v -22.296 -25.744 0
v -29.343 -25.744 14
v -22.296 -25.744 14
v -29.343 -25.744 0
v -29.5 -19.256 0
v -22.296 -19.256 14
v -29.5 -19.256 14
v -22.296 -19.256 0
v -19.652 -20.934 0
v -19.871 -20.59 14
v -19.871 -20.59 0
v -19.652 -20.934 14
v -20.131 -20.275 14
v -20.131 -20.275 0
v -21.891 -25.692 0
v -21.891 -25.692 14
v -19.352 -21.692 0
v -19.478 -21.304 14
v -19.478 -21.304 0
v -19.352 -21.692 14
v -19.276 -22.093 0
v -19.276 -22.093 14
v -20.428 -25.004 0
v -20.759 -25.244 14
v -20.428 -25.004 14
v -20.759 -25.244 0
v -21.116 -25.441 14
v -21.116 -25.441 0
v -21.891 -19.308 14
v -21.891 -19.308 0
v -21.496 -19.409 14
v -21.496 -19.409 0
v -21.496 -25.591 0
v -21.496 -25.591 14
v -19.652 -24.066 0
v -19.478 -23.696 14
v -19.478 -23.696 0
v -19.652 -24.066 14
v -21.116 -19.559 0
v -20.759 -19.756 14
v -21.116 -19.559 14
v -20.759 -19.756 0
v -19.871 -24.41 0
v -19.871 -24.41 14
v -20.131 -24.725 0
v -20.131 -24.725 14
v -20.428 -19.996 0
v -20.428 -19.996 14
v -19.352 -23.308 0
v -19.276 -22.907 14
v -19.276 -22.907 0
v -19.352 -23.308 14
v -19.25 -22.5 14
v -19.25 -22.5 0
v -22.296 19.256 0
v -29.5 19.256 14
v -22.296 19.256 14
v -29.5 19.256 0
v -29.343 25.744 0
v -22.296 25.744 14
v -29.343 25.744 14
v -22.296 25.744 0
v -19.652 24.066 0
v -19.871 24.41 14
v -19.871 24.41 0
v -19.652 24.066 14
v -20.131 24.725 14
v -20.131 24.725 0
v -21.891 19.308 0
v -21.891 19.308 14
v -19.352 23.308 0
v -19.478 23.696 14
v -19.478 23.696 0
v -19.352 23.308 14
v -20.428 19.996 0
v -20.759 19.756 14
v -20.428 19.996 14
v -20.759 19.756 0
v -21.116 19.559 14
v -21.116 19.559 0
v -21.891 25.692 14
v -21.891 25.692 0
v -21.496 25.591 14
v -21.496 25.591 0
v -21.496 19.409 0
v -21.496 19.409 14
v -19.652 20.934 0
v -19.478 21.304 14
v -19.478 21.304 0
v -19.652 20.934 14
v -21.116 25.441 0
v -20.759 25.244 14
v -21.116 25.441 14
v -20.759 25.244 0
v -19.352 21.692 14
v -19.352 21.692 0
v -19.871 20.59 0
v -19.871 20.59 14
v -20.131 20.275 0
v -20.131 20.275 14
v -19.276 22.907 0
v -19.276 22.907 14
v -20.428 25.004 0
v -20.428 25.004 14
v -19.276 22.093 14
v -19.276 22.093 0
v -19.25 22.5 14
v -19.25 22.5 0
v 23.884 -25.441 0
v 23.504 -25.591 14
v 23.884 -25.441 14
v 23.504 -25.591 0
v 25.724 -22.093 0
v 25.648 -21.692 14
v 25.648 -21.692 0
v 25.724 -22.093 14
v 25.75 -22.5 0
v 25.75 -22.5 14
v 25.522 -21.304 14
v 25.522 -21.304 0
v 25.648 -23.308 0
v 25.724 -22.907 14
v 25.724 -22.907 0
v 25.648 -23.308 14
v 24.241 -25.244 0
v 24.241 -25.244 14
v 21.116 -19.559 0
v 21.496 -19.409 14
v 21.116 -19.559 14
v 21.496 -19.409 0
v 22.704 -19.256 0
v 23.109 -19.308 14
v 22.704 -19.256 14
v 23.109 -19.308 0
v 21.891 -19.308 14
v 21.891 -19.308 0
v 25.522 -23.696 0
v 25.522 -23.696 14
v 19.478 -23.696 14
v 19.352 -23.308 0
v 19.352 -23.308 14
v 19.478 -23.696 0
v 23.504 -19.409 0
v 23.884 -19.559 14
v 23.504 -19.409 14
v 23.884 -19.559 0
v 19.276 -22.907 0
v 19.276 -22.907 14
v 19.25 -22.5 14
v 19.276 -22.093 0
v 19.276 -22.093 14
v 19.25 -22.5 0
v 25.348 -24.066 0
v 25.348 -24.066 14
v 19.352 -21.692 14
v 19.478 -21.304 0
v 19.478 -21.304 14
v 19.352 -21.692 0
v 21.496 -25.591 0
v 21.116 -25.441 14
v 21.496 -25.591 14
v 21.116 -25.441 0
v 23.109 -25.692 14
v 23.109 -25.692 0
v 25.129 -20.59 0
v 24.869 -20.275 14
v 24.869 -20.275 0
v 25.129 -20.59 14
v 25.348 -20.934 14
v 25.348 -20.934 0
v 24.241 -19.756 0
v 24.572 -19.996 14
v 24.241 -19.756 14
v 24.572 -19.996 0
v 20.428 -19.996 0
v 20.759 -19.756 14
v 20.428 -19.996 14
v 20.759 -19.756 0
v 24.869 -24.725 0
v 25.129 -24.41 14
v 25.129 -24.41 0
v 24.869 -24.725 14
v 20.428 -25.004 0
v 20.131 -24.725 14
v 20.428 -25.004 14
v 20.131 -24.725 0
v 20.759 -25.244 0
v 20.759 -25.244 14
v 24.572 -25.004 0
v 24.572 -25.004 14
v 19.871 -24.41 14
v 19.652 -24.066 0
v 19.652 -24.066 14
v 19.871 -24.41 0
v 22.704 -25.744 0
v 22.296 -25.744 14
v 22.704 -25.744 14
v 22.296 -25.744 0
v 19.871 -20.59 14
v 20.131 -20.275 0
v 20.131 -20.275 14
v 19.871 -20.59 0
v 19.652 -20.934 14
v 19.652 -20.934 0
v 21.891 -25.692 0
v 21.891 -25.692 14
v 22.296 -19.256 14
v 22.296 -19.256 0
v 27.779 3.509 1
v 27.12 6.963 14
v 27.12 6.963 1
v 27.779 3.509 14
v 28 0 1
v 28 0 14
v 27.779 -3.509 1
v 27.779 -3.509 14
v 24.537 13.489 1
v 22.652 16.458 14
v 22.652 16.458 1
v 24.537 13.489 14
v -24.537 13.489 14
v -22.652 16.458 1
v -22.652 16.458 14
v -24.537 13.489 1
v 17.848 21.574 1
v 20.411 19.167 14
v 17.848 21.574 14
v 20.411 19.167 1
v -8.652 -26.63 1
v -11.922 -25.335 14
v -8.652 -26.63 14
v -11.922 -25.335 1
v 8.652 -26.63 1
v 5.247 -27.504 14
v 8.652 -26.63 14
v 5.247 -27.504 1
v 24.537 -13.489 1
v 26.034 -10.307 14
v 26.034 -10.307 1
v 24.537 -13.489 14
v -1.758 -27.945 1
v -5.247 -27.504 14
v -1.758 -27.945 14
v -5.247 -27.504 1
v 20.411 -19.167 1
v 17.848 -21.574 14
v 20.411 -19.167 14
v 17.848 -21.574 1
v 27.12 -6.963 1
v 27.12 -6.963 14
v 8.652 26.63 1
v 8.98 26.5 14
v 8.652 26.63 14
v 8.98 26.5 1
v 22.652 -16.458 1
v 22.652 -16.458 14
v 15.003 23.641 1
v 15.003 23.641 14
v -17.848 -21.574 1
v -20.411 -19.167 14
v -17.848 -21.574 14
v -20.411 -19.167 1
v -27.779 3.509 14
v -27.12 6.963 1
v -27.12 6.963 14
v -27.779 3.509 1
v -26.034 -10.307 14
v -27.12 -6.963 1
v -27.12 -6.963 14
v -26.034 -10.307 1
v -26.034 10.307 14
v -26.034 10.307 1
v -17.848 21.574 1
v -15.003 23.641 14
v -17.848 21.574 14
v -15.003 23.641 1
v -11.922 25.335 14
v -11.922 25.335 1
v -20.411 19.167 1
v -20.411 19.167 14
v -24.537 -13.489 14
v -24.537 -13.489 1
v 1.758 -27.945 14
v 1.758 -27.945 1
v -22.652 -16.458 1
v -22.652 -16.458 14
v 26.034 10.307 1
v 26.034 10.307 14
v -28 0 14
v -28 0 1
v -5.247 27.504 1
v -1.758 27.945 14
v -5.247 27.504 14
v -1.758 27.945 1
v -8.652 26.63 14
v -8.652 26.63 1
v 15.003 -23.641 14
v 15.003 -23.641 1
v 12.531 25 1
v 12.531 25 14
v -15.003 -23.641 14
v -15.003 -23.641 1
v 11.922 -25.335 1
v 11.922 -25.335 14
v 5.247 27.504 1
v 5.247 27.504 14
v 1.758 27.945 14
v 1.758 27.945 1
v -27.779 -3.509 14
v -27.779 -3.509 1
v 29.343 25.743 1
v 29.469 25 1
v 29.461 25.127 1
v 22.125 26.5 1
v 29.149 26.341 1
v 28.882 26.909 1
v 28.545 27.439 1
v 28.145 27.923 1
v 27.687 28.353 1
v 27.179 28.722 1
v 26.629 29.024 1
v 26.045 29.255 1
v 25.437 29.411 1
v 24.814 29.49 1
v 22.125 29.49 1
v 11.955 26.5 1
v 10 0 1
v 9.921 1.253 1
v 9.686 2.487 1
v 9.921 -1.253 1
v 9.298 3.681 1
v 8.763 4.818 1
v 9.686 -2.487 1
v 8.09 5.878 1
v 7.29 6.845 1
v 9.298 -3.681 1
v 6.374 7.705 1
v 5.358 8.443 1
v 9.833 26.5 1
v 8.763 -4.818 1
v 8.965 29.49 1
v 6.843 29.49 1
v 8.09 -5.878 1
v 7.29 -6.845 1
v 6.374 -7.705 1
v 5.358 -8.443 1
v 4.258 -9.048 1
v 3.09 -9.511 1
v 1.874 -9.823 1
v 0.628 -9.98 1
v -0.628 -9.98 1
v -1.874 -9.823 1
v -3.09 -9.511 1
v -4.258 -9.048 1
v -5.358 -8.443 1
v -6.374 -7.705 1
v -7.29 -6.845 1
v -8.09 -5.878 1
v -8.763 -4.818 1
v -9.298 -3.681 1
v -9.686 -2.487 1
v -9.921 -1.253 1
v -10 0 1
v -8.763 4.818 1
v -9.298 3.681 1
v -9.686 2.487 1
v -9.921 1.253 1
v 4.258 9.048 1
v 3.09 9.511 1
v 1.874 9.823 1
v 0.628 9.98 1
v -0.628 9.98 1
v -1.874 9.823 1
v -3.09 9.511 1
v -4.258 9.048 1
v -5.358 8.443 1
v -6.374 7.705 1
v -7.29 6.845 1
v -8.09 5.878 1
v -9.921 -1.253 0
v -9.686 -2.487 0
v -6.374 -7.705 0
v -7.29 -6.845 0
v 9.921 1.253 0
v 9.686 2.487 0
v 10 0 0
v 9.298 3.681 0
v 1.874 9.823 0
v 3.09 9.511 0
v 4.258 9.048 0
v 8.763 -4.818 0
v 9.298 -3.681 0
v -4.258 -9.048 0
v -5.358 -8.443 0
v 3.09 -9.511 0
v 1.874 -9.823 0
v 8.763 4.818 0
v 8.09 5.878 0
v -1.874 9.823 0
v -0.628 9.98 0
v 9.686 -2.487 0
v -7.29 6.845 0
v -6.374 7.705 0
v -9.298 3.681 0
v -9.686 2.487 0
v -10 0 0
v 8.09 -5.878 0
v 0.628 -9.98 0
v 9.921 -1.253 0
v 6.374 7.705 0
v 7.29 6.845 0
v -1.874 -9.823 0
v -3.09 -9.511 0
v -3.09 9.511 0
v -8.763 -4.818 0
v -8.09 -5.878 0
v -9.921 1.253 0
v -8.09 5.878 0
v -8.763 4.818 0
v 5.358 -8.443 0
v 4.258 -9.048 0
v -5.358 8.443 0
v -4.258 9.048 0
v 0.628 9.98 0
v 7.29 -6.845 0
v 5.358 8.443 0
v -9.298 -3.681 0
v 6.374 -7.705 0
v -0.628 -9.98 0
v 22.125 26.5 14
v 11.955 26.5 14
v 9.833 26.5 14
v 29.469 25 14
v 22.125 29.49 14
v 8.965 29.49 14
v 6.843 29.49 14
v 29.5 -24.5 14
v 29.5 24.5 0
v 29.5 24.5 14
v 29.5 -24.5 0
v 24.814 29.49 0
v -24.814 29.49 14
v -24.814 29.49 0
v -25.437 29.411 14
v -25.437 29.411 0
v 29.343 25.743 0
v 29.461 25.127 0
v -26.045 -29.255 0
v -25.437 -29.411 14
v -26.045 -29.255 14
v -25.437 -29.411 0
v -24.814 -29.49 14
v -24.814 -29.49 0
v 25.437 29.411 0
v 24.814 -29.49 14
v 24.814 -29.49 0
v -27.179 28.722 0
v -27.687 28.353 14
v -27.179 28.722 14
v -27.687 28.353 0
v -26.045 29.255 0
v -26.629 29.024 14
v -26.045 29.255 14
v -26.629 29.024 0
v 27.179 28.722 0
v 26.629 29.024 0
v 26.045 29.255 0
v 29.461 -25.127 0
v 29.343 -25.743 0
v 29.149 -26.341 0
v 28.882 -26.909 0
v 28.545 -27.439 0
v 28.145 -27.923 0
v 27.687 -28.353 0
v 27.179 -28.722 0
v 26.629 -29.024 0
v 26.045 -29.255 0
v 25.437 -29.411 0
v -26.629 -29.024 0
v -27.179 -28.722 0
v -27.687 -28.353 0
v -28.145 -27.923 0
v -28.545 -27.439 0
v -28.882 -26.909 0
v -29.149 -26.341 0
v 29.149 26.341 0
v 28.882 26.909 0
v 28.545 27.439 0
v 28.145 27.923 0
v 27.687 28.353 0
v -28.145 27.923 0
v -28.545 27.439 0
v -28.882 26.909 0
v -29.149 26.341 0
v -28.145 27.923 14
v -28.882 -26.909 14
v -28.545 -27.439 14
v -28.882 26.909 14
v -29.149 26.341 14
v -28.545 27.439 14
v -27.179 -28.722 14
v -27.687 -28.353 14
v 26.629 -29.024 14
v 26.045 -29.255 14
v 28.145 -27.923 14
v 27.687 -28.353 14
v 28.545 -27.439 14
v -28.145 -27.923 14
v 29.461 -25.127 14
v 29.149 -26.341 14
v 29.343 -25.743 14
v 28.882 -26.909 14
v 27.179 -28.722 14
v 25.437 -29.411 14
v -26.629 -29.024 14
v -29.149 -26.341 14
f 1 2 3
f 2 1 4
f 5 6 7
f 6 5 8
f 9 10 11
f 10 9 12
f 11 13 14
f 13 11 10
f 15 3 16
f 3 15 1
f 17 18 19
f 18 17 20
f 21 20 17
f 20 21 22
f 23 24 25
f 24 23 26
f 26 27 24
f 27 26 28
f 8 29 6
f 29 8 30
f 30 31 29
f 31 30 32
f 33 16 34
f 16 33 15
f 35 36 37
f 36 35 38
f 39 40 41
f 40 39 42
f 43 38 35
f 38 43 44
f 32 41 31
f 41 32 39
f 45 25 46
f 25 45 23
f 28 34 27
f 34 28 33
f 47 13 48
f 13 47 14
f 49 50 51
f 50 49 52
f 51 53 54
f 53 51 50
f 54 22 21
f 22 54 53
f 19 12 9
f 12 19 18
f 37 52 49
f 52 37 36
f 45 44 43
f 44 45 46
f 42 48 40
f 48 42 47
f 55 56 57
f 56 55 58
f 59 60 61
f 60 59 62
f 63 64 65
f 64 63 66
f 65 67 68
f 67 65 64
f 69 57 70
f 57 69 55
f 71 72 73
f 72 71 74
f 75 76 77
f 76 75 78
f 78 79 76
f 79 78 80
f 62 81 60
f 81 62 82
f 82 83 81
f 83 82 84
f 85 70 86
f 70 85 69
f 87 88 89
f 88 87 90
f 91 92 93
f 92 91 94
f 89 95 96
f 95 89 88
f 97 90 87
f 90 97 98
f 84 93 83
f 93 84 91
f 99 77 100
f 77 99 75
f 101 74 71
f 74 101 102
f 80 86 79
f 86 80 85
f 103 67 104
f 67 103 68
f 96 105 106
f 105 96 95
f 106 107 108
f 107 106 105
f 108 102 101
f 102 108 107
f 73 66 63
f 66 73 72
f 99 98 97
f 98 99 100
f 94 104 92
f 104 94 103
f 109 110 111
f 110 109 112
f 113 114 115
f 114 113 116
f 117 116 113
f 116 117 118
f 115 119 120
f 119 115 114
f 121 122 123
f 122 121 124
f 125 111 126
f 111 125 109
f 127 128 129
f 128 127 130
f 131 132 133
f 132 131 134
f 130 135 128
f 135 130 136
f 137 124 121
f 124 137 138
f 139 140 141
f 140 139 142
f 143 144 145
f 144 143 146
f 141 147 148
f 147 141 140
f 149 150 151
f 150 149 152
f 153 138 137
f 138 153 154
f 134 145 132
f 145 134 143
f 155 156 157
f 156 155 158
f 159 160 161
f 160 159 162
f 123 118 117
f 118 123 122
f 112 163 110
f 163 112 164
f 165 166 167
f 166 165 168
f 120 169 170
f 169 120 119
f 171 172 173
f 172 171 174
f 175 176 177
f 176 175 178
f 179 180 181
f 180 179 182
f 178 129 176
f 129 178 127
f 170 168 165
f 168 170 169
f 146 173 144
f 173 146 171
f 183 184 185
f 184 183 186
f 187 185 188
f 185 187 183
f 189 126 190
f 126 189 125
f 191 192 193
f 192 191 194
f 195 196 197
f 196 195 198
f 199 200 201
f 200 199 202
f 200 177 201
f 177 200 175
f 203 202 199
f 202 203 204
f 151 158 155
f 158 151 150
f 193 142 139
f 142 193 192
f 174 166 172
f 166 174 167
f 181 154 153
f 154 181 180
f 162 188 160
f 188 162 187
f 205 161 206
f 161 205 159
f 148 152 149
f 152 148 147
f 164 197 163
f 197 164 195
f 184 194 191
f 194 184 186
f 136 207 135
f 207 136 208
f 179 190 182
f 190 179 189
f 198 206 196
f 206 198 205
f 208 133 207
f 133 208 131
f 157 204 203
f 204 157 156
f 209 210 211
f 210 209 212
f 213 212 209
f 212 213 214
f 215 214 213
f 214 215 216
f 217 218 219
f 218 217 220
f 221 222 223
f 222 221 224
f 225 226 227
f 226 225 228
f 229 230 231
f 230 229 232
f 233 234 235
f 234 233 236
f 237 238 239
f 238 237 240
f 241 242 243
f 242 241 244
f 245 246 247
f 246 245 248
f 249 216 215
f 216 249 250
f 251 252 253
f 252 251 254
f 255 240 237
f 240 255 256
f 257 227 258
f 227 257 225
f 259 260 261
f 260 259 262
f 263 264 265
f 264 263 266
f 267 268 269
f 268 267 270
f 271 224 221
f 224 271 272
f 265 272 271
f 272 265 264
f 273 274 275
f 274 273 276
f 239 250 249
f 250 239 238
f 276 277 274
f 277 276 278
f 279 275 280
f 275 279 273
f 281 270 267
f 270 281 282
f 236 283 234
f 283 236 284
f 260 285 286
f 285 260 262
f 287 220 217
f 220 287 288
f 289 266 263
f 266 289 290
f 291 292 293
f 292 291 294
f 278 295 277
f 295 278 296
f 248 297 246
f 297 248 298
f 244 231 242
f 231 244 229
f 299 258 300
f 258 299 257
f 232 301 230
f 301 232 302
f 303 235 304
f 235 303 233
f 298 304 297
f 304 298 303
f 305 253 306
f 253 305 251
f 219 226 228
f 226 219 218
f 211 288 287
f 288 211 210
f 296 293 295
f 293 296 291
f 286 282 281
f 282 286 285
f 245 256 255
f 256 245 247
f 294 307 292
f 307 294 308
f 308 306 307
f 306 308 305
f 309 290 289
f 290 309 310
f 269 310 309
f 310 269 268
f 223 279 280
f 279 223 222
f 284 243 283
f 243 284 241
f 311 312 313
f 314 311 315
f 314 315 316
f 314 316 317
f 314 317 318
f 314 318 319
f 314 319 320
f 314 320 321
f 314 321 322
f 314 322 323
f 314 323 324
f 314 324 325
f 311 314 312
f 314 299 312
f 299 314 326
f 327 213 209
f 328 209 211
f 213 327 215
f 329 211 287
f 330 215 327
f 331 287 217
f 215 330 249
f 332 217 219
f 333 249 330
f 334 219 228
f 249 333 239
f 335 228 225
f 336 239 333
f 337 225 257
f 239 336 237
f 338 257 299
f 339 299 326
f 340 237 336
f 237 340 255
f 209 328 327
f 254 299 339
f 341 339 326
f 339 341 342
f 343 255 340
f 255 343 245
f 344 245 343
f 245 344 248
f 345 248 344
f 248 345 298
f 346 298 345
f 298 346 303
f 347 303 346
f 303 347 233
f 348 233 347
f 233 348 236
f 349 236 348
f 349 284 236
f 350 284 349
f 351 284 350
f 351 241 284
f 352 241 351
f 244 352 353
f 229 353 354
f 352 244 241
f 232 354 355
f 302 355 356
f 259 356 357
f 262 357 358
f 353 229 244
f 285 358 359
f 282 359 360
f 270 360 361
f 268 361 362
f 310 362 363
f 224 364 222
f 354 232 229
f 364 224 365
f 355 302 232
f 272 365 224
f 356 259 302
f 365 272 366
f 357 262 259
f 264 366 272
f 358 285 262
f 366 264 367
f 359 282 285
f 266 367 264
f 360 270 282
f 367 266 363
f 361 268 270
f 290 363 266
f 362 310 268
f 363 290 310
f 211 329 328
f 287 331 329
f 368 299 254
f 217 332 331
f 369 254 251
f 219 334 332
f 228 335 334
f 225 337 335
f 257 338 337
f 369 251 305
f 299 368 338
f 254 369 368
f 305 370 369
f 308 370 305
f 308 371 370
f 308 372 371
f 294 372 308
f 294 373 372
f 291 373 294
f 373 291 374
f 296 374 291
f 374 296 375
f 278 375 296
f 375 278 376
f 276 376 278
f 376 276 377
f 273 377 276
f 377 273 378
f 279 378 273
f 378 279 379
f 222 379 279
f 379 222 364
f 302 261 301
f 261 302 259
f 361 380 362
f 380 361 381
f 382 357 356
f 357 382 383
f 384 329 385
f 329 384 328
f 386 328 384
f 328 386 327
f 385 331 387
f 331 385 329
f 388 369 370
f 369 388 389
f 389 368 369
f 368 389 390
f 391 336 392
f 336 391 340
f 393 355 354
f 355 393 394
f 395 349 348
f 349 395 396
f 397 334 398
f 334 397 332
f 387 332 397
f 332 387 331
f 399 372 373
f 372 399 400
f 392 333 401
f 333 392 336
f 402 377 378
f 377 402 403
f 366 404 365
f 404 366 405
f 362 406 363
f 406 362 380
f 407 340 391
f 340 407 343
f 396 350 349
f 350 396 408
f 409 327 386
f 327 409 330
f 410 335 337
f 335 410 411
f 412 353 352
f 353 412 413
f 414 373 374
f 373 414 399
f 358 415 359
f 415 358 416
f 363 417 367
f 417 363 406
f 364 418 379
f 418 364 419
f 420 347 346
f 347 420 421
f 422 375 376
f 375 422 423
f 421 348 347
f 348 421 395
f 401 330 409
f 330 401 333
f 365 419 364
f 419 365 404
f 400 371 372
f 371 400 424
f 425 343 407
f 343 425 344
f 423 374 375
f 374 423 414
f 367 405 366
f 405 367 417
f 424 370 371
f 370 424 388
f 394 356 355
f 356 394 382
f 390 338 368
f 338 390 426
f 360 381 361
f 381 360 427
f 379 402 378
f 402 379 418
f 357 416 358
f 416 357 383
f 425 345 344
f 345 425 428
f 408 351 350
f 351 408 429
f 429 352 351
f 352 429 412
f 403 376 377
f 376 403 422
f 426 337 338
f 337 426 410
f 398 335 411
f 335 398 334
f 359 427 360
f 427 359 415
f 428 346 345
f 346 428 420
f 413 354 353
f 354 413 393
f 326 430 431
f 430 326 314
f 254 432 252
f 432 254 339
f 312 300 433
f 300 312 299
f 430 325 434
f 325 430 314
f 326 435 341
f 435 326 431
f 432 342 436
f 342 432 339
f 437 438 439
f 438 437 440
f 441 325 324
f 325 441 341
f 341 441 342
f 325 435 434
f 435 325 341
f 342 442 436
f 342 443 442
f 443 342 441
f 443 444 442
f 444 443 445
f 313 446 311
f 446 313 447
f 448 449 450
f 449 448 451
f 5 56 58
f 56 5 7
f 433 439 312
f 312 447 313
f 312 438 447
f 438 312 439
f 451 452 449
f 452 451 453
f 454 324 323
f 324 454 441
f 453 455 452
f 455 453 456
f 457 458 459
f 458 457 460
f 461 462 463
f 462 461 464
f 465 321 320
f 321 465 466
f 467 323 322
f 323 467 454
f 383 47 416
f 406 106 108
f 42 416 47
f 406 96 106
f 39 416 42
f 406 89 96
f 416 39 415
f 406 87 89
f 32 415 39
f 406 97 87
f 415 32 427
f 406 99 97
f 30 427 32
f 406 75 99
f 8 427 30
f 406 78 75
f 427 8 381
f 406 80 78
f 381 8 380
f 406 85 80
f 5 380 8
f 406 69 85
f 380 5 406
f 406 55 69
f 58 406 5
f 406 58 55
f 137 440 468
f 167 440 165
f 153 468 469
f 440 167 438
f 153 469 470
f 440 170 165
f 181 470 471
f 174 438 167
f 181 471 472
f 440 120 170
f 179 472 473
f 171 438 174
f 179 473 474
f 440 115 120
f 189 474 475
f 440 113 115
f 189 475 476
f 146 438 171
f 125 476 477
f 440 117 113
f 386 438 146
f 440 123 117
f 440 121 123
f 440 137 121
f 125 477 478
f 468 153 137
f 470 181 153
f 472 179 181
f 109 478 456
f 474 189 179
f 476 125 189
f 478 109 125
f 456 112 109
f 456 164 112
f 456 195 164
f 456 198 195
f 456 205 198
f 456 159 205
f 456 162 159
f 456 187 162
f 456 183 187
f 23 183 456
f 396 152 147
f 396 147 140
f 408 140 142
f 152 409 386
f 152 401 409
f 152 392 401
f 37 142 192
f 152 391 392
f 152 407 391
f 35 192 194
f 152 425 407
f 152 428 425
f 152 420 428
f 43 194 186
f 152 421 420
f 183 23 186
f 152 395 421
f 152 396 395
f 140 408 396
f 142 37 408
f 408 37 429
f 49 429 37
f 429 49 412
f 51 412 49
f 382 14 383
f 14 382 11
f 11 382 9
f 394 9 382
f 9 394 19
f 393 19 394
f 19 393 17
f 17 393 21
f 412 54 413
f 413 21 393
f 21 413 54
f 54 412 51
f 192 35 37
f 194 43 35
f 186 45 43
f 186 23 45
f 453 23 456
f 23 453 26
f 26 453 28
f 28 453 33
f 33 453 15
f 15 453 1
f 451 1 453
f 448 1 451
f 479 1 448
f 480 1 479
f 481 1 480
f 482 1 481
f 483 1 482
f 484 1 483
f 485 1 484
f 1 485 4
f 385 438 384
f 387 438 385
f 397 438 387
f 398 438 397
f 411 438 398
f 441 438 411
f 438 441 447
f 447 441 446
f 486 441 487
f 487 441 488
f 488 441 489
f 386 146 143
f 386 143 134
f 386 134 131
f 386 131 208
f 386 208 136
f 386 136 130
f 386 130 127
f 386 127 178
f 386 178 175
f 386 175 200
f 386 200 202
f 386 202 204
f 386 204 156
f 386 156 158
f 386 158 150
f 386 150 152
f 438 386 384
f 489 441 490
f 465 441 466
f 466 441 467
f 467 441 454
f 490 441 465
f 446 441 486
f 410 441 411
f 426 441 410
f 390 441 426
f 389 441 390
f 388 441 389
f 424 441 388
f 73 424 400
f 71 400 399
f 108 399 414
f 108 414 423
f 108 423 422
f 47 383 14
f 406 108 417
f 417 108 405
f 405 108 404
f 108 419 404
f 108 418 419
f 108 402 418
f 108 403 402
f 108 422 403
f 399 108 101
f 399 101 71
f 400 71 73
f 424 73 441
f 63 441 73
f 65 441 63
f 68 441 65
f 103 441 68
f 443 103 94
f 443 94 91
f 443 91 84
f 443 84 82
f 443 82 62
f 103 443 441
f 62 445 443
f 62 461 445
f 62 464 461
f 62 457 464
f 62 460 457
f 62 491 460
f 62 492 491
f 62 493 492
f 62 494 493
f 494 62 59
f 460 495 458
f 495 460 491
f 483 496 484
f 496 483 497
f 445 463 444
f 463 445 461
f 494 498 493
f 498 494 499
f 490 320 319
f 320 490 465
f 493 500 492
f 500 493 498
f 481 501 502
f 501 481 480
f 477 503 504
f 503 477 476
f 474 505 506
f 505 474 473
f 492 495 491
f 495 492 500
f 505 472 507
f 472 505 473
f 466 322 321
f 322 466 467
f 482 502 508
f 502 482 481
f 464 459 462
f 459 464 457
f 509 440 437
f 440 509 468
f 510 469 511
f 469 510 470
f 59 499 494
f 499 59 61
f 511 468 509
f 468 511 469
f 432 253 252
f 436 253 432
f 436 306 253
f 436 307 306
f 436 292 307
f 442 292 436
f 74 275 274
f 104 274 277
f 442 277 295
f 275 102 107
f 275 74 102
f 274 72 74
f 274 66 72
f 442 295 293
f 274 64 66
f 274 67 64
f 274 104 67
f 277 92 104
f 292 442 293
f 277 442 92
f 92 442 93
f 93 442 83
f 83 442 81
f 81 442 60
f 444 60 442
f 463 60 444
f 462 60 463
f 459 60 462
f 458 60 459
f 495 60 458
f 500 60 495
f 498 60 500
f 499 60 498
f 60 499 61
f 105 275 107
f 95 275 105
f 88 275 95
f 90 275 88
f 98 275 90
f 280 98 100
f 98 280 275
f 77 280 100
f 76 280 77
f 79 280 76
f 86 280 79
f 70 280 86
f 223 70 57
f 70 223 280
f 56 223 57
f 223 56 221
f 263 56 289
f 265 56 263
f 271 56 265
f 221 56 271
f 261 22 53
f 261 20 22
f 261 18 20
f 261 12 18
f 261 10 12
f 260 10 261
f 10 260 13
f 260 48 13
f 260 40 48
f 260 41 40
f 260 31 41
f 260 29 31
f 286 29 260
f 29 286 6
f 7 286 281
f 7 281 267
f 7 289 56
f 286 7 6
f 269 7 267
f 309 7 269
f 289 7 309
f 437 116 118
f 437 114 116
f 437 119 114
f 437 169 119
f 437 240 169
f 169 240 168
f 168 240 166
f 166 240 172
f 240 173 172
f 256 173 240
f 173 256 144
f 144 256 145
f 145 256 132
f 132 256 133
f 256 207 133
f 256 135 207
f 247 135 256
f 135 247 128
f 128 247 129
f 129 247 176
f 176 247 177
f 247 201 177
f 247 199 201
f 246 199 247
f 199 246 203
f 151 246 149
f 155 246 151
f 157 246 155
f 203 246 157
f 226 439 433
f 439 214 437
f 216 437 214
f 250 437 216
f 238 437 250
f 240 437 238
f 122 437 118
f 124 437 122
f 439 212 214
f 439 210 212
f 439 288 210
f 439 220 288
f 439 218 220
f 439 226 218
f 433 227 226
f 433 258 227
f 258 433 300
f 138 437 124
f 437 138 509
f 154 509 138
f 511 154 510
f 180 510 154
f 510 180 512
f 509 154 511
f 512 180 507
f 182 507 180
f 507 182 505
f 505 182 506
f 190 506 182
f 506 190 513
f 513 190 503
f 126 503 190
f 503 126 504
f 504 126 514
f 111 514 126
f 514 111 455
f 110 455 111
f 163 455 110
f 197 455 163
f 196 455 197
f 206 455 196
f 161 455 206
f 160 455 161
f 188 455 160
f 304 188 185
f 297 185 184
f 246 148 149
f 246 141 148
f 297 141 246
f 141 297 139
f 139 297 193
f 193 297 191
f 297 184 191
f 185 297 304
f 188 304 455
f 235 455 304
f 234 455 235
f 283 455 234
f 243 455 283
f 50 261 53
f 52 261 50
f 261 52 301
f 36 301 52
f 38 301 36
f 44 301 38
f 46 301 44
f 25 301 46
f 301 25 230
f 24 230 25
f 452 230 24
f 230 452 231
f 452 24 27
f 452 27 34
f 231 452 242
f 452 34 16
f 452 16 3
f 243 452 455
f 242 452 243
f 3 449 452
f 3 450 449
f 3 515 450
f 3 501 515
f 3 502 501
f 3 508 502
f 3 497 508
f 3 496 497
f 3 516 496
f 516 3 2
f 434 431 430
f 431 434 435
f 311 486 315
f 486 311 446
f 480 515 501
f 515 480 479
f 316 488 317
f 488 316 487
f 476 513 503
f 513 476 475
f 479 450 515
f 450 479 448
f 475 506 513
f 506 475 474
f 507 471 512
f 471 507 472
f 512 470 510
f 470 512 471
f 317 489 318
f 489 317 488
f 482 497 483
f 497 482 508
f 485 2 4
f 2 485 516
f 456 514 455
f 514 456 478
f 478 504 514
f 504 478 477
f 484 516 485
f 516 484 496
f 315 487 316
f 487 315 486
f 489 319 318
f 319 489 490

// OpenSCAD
$fn = 50;


difference() {
	union() {
		translate(v = [0, 0, 0]) {
			rotate(a = [0, 0, 0]) {
				hull() {
					translate(v = [-24.5000000000, 24.5000000000, 0]) {
						rotate(a = [0, 0, 0]) {
							translate(v = [0, 0, 0]) {
								rotate(a = [0, 0, 0]) {
									cylinder(h = 14, r = 5);
								}
							}
						}
					}
					translate(v = [24.5000000000, 24.5000000000, 0]) {
						rotate(a = [0, 0, 0]) {
							translate(v = [0, 0, 0]) {
								rotate(a = [0, 0, 0]) {
									cylinder(h = 14, r = 5);
								}
							}
						}
					}
					translate(v = [-24.5000000000, -24.5000000000, 0]) {
						rotate(a = [0, 0, 0]) {
							translate(v = [0, 0, 0]) {
								rotate(a = [0, 0, 0]) {
									cylinder(h = 14, r = 5);
								}
							}
						}
					}
					translate(v = [24.5000000000, -24.5000000000, 0]) {
						rotate(a = [0, 0, 0]) {
							translate(v = [0, 0, 0]) {
								rotate(a = [0, 0, 0]) {
									cylinder(h = 14, r = 5);
								}
							}
						}
					}
				}
			}
		}
	}
	union() {
		translate(v = [-30.0000000000, -22.5000000000, -125]) {
			rotate(a = [0, 0, 0]) {
				hull() {
					translate(v = [7.5000000000, 0, 0]) {
						rotate(a = [0, 0, 0]) {
							translate(v = [0, 0, 0]) {
								rotate(a = [0, 0, 0]) {
									cylinder(h = 250, r = 3.2500000000);
								}
							}
						}
					}
					translate(v = [-7.5000000000, 0, 0]) {
						rotate(a = [0, 0, 0]) {
							translate(v = [0, 0, 0]) {
								rotate(a = [0, 0, 0]) {
									cylinder(h = 250, r = 3.2500000000);
								}
							}
						}
					}
				}
			}
		}
		translate(v = [-30.0000000000, 22.5000000000, -125]) {
			rotate(a = [0, 0, 0]) {
				hull() {
					translate(v = [7.5000000000, 0, 0]) {
						rotate(a = [0, 0, 0]) {
							translate(v = [0, 0, 0]) {
								rotate(a = [0, 0, 0]) {
									cylinder(h = 250, r = 3.2500000000);
								}
							}
						}
					}
					translate(v = [-7.5000000000, 0, 0]) {
						rotate(a = [0, 0, 0]) {
							translate(v = [0, 0, 0]) {
								rotate(a = [0, 0, 0]) {
									cylinder(h = 250, r = 3.2500000000);
								}
							}
						}
					}
				}
			}
		}
		translate(v = [22.5000000000, -22.5000000000, -125.0000000000]) {
			rotate(a = [0, 0, 0]) {
				cylinder(h = 250, r = 3.2500000000);
			}
		}
		translate(v = [0, 0, 1.0000000000]) {
			rotate(a = [0, 0, 0]) {
				cylinder(h = 16, r = 28.0000000000);
			}
		}
		translate(v = [0, 0, -7.0000000000]) {
			rotate(a = [0, 0, 0]) {
				cylinder(h = 14, r = 10.0000000000);
			}
		}
		translate(v = [0.0000000000, 25.0000000000, 1]) {
			rotate(a = [0, 0, 0]) {
				cube(size = [29.5000000000, 1.5000000000, 16]);
			}
		}
		translate(v = [22.1250000000, 25.0000000000, 1]) {
			rotate(a = [0, 0, 0]) {
				cube(size = [7.3750000000, 4.5000000000, 16]);
			}
		}
		translate(v = [6.0833333333, 30.2500000000, 1]) {
			rotate(a = [0, 0, -45]) {
				cube(size = [7.5000000000, 1.5000000000, 16]);
			}
		}
	}
}
